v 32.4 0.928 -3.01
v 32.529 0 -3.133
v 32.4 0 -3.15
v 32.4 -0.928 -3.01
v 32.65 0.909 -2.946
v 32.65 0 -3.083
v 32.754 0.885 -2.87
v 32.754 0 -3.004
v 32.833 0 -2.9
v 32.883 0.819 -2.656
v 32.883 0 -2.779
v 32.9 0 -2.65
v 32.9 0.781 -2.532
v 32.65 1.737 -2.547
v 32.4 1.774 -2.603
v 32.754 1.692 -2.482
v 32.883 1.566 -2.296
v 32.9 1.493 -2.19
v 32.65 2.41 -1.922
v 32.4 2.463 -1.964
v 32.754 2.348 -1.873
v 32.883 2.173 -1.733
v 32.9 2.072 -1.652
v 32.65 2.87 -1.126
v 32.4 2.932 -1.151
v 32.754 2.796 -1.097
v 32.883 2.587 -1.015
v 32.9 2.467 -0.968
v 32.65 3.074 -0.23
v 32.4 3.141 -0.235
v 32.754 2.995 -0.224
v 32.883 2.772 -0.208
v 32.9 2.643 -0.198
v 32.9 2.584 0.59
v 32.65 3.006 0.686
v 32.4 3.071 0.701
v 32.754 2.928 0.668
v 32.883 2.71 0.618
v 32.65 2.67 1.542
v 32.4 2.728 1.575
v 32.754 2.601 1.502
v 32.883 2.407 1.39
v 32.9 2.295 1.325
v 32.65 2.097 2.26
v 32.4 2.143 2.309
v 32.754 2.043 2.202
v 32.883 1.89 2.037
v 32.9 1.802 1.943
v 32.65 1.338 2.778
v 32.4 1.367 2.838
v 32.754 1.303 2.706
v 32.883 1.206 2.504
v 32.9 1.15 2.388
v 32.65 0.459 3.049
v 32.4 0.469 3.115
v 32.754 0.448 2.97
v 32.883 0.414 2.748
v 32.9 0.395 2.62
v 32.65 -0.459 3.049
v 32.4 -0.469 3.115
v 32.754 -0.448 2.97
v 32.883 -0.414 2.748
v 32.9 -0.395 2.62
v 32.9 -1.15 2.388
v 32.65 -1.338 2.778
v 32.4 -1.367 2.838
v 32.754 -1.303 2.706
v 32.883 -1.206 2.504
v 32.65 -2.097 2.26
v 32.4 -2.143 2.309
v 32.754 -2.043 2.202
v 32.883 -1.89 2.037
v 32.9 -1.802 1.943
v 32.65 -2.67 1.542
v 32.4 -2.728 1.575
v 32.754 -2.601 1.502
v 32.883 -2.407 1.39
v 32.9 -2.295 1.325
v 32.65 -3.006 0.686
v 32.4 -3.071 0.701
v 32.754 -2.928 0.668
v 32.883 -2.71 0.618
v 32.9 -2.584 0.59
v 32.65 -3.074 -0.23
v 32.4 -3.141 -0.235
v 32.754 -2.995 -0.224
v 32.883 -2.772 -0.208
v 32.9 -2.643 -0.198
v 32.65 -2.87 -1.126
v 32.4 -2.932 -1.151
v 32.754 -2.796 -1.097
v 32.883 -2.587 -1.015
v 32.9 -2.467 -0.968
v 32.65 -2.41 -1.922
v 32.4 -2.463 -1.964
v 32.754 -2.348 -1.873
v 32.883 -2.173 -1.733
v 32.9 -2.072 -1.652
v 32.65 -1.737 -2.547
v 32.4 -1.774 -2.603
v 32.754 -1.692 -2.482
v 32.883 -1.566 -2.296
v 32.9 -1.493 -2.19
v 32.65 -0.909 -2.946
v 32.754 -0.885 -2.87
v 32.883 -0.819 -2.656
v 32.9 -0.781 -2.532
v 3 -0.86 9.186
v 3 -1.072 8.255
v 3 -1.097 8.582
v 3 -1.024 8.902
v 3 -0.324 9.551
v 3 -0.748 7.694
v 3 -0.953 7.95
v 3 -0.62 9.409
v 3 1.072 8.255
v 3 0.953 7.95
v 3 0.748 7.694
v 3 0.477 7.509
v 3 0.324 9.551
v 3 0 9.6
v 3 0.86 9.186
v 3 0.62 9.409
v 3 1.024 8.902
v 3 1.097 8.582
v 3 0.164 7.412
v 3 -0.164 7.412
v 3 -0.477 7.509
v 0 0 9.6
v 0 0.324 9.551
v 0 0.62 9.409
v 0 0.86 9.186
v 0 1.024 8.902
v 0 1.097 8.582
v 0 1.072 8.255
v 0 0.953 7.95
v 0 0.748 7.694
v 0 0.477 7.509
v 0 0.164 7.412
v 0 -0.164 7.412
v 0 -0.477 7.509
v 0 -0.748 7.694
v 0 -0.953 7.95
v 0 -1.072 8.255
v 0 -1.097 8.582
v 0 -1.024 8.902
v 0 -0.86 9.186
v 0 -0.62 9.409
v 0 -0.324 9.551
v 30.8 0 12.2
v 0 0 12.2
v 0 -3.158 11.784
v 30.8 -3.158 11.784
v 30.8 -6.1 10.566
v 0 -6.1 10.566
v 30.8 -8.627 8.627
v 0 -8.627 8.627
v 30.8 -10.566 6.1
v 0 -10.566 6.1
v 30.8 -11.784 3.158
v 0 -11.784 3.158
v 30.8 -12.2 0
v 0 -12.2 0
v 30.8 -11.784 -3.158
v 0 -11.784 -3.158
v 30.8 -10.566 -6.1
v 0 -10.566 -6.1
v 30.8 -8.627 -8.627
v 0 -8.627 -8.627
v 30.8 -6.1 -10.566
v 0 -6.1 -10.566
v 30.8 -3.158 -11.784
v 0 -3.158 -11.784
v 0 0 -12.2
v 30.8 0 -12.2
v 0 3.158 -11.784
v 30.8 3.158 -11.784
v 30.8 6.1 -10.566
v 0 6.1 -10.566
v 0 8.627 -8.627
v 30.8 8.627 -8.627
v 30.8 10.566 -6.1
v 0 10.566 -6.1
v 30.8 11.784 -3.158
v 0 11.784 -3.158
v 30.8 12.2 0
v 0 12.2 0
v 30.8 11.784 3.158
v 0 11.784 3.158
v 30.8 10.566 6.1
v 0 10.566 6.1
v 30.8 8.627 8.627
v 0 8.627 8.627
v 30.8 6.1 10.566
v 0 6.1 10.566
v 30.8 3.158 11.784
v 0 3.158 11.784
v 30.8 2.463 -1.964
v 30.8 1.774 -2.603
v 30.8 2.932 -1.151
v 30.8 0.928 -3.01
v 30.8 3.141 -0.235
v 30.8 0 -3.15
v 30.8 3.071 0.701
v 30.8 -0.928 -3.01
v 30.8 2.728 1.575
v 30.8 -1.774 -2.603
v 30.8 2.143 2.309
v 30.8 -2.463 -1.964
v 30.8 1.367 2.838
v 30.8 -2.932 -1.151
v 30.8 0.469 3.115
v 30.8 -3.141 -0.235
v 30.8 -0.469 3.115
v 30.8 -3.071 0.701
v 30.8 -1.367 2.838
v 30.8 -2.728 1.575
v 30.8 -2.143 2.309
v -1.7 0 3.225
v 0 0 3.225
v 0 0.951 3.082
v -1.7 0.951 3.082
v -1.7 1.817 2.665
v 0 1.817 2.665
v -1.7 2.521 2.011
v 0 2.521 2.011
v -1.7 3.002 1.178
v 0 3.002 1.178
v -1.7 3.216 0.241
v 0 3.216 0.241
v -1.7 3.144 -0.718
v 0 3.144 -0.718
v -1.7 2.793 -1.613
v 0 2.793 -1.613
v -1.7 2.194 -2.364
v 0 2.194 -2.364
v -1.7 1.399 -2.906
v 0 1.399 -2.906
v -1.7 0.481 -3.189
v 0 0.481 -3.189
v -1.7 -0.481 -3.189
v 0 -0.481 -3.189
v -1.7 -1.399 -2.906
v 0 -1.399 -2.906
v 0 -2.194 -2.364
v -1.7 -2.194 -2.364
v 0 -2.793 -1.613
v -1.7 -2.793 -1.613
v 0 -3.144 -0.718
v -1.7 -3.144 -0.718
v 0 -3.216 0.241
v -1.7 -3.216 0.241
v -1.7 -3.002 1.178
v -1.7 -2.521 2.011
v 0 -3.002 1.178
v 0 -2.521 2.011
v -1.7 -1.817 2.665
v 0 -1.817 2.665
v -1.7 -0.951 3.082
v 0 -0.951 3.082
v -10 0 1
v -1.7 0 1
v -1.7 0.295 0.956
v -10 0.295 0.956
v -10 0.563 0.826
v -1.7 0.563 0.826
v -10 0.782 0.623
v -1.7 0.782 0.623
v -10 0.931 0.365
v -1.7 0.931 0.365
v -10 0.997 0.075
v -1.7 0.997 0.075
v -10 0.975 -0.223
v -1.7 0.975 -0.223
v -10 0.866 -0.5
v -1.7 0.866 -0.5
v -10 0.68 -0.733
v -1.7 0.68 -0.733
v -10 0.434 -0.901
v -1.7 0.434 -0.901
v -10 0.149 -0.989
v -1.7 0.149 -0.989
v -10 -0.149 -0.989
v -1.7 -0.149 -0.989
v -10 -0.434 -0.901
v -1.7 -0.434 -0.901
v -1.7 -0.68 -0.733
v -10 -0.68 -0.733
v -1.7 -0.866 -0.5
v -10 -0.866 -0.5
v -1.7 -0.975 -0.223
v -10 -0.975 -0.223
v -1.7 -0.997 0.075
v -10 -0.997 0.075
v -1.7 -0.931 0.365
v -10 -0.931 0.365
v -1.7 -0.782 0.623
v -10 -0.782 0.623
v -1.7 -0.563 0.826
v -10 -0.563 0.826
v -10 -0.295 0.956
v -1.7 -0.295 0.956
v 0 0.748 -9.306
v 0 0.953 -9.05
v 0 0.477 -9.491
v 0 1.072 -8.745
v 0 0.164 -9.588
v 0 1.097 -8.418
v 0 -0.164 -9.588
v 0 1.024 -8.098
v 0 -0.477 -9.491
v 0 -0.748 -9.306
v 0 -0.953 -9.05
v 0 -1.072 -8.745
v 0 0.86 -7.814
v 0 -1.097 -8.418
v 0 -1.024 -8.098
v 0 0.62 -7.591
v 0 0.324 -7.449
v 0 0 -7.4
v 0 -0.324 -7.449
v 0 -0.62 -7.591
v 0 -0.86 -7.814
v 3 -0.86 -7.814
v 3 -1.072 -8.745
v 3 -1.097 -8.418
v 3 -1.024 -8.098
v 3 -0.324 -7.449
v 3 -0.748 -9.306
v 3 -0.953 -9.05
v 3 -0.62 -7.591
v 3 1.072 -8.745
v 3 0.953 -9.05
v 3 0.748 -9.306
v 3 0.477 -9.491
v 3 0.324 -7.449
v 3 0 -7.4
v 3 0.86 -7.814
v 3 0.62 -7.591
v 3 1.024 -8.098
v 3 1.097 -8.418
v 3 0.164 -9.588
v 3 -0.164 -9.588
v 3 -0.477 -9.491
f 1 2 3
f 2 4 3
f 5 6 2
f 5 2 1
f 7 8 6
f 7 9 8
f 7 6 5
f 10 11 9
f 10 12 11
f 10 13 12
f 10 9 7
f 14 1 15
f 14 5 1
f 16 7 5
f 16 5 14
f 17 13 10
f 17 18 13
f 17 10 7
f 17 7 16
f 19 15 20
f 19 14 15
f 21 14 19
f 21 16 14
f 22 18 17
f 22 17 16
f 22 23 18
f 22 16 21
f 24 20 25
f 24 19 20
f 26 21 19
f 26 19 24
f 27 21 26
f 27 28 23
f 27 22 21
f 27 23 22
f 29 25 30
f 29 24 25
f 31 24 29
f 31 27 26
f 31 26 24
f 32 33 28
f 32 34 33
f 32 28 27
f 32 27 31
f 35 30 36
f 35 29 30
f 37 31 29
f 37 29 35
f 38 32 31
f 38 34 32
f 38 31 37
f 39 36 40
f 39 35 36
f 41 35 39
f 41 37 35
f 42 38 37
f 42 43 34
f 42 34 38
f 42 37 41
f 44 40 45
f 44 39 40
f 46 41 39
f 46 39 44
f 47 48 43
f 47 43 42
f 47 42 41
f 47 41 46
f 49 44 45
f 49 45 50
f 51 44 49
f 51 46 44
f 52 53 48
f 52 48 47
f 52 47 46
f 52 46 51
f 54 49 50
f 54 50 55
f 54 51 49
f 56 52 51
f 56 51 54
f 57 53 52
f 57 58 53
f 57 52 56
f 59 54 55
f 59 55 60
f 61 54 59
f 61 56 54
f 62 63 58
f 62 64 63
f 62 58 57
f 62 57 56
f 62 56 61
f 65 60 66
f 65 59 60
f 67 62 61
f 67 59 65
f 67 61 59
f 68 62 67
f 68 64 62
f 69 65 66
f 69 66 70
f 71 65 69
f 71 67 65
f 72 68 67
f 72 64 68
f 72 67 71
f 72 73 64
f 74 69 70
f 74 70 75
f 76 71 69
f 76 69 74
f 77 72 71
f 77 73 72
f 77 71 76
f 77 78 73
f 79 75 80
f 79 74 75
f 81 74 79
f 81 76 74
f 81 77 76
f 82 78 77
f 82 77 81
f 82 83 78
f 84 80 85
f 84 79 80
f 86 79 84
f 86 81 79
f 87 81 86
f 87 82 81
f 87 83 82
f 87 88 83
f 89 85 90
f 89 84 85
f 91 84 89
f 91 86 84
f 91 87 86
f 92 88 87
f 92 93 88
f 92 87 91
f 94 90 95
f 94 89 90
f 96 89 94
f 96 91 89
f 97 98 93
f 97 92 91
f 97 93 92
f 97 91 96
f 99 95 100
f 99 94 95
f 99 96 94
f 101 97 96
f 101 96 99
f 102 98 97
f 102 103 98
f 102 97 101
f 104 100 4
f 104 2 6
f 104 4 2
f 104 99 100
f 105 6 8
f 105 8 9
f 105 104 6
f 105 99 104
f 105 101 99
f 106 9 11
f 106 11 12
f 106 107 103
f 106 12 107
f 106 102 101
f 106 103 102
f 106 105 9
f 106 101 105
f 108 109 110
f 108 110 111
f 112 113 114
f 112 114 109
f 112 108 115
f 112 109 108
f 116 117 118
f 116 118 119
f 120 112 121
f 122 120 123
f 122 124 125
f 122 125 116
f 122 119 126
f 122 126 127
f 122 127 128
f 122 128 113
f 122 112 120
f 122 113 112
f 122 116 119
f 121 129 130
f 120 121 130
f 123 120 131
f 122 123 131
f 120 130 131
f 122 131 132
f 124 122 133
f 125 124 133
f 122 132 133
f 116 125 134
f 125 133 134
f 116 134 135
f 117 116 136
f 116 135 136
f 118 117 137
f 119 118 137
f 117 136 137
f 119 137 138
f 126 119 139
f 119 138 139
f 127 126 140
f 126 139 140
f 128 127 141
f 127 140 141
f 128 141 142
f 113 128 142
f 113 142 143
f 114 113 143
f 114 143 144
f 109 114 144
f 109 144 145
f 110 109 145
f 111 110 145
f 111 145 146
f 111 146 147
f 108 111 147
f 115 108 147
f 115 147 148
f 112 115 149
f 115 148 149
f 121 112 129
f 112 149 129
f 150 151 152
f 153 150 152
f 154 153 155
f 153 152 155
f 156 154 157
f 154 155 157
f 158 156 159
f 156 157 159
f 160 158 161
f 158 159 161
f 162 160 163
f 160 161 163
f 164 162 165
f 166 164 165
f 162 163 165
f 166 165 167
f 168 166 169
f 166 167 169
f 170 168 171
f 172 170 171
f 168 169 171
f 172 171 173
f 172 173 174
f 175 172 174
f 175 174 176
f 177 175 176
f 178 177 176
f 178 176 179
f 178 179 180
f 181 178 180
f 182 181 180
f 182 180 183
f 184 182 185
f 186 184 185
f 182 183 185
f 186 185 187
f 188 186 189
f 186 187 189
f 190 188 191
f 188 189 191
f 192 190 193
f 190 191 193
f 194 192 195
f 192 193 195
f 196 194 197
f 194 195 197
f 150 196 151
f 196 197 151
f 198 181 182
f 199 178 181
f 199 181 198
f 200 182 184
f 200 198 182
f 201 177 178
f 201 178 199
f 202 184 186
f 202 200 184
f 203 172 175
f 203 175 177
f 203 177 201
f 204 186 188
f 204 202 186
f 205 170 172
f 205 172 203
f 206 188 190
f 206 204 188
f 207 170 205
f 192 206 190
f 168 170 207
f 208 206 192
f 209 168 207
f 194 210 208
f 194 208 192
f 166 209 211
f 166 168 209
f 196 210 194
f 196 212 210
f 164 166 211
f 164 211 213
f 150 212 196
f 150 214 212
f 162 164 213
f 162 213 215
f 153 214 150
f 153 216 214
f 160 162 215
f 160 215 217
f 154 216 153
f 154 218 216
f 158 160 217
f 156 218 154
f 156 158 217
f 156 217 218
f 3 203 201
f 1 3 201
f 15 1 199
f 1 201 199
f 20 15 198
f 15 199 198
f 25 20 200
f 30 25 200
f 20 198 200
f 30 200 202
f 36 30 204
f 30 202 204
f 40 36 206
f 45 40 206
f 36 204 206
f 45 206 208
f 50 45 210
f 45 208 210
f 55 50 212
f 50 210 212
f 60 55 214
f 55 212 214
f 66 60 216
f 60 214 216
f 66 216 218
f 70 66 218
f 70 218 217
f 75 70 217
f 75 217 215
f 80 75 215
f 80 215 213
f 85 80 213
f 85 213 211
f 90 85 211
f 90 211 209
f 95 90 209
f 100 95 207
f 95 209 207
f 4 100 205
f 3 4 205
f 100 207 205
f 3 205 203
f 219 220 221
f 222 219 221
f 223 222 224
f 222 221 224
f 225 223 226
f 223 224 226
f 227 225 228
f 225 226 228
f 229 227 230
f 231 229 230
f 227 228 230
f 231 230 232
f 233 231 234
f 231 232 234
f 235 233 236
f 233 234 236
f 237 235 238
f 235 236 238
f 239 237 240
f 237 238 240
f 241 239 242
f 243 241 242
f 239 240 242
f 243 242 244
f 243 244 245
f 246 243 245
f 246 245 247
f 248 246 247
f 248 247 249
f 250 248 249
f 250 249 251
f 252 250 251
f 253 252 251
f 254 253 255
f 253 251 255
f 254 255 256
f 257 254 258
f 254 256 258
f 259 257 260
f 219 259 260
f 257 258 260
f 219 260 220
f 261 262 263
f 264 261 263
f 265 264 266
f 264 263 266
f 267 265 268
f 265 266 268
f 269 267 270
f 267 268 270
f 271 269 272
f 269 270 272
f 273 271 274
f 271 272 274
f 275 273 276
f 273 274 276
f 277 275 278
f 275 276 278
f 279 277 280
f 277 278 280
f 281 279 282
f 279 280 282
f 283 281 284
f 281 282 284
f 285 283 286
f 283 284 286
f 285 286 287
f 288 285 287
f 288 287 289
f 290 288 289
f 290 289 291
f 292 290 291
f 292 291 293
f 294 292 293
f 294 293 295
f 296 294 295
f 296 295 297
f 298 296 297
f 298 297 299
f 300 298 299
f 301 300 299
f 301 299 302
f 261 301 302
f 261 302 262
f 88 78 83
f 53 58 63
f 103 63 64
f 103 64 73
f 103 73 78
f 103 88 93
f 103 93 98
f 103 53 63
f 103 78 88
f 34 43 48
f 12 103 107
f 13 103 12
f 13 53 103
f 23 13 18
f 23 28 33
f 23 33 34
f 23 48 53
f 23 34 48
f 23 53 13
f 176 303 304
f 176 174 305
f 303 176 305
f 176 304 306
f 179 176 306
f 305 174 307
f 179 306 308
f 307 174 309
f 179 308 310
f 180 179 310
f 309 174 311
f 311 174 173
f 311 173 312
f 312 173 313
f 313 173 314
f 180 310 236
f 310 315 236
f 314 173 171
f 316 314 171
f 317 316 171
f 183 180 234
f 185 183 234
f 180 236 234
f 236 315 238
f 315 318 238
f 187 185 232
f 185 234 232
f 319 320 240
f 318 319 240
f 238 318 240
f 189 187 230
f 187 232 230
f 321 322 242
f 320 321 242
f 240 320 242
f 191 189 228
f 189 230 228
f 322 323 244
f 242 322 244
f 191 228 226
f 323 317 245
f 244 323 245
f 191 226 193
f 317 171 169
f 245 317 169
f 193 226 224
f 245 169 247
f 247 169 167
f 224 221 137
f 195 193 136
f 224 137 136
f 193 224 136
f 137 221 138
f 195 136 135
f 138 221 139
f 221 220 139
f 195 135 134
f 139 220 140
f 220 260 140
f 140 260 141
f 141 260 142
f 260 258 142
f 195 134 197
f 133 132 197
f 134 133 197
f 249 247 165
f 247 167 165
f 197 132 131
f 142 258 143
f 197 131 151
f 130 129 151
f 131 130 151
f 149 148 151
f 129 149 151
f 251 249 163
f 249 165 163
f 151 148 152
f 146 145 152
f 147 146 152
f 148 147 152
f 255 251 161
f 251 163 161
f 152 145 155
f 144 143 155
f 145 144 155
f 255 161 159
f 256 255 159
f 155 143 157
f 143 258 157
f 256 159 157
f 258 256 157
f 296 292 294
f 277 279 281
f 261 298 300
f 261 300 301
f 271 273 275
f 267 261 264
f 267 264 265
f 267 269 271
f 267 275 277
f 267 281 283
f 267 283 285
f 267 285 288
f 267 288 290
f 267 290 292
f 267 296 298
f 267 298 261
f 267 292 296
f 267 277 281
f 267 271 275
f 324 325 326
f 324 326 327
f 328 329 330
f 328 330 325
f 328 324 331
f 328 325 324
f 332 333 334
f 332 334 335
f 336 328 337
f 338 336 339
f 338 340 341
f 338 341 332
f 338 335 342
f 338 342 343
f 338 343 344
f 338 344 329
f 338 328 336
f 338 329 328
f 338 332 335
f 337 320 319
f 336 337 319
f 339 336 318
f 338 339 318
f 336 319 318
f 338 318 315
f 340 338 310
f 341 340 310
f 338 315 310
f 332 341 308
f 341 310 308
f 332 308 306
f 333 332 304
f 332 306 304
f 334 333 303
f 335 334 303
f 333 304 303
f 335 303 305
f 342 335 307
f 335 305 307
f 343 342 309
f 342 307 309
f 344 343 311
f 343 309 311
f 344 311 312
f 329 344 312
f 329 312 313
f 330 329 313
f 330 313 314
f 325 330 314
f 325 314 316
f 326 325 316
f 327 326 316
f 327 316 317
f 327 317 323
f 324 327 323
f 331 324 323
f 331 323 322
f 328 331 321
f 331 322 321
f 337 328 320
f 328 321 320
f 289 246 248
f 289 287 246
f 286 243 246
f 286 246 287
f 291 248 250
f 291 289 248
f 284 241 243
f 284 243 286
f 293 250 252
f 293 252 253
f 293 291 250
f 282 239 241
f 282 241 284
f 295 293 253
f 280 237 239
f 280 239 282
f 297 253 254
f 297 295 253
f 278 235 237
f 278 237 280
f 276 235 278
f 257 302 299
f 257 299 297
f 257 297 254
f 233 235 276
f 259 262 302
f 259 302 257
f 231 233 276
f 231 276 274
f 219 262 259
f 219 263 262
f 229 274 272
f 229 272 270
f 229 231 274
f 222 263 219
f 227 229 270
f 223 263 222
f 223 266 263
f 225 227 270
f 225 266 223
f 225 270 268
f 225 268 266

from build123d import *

# Parameters (mm, degrees)
SKETCH_1_R          = 12.2
EXTRUDE_1_DEPTH     = 30.8
SKETCH_3_R          = 3.15
EXTRUDE_2_DEPTH     = 2.1
FILLET_1_R          = 0.5
SKETCH_4_R          = 3.225
EXTRUDE_3_DEPTH     = 1.7
SKETCH_6_R          = 1
EXTRUDE_4_DEPTH     = 10
SKETCH_7_R          = 1.1
CUT_EXTRUDE_2_DEPTH = 3


with BuildPart() as part:
    # 草图1 → 凸台-拉伸1 (new body)
    with BuildSketch(Plane(origin=(0, 0, 0), x_dir=(0, 0, -1), z_dir=(1, 0, 0))):
        with Locations(Location((0, 0, 0), (0, 0, 180))):
            Circle(SKETCH_1_R)
    extrude(amount=EXTRUDE_1_DEPTH)

    # 草图3 → 凸台-拉伸2 (add)
    with BuildSketch(Plane(origin=(30.8, 0, 0), x_dir=(0, 0, -1), z_dir=(1, 0, 0))):
        Circle(SKETCH_3_R)
    extrude(amount=EXTRUDE_2_DEPTH)

    # 圆角1
    fillet_1_edges = [part.edges().sort_by_distance(p)[0] for p in [
        (32.9, 0, 3.15),
    ]]
    fillet(fillet_1_edges, radius=FILLET_1_R)

    # 草图4 → 凸台-拉伸3 (add)
    with BuildSketch(Plane.ZY):
        Circle(SKETCH_4_R)
    extrude(amount=EXTRUDE_3_DEPTH)

    # 草图6 → 凸台-拉伸4 (add)
    with BuildSketch(Plane.ZY):
        Circle(SKETCH_6_R)
    extrude(amount=EXTRUDE_4_DEPTH)

    # 草图7 → 切除-拉伸2 (cut)
    with BuildSketch(Plane.ZY):
        with Locations((8.5, 0)):
            Circle(SKETCH_7_R)
        with Locations((-8.5, 0)):
            Circle(SKETCH_7_R)
    extrude(amount=-CUT_EXTRUDE_2_DEPTH, mode=Mode.SUBTRACT)


solid = part.part
